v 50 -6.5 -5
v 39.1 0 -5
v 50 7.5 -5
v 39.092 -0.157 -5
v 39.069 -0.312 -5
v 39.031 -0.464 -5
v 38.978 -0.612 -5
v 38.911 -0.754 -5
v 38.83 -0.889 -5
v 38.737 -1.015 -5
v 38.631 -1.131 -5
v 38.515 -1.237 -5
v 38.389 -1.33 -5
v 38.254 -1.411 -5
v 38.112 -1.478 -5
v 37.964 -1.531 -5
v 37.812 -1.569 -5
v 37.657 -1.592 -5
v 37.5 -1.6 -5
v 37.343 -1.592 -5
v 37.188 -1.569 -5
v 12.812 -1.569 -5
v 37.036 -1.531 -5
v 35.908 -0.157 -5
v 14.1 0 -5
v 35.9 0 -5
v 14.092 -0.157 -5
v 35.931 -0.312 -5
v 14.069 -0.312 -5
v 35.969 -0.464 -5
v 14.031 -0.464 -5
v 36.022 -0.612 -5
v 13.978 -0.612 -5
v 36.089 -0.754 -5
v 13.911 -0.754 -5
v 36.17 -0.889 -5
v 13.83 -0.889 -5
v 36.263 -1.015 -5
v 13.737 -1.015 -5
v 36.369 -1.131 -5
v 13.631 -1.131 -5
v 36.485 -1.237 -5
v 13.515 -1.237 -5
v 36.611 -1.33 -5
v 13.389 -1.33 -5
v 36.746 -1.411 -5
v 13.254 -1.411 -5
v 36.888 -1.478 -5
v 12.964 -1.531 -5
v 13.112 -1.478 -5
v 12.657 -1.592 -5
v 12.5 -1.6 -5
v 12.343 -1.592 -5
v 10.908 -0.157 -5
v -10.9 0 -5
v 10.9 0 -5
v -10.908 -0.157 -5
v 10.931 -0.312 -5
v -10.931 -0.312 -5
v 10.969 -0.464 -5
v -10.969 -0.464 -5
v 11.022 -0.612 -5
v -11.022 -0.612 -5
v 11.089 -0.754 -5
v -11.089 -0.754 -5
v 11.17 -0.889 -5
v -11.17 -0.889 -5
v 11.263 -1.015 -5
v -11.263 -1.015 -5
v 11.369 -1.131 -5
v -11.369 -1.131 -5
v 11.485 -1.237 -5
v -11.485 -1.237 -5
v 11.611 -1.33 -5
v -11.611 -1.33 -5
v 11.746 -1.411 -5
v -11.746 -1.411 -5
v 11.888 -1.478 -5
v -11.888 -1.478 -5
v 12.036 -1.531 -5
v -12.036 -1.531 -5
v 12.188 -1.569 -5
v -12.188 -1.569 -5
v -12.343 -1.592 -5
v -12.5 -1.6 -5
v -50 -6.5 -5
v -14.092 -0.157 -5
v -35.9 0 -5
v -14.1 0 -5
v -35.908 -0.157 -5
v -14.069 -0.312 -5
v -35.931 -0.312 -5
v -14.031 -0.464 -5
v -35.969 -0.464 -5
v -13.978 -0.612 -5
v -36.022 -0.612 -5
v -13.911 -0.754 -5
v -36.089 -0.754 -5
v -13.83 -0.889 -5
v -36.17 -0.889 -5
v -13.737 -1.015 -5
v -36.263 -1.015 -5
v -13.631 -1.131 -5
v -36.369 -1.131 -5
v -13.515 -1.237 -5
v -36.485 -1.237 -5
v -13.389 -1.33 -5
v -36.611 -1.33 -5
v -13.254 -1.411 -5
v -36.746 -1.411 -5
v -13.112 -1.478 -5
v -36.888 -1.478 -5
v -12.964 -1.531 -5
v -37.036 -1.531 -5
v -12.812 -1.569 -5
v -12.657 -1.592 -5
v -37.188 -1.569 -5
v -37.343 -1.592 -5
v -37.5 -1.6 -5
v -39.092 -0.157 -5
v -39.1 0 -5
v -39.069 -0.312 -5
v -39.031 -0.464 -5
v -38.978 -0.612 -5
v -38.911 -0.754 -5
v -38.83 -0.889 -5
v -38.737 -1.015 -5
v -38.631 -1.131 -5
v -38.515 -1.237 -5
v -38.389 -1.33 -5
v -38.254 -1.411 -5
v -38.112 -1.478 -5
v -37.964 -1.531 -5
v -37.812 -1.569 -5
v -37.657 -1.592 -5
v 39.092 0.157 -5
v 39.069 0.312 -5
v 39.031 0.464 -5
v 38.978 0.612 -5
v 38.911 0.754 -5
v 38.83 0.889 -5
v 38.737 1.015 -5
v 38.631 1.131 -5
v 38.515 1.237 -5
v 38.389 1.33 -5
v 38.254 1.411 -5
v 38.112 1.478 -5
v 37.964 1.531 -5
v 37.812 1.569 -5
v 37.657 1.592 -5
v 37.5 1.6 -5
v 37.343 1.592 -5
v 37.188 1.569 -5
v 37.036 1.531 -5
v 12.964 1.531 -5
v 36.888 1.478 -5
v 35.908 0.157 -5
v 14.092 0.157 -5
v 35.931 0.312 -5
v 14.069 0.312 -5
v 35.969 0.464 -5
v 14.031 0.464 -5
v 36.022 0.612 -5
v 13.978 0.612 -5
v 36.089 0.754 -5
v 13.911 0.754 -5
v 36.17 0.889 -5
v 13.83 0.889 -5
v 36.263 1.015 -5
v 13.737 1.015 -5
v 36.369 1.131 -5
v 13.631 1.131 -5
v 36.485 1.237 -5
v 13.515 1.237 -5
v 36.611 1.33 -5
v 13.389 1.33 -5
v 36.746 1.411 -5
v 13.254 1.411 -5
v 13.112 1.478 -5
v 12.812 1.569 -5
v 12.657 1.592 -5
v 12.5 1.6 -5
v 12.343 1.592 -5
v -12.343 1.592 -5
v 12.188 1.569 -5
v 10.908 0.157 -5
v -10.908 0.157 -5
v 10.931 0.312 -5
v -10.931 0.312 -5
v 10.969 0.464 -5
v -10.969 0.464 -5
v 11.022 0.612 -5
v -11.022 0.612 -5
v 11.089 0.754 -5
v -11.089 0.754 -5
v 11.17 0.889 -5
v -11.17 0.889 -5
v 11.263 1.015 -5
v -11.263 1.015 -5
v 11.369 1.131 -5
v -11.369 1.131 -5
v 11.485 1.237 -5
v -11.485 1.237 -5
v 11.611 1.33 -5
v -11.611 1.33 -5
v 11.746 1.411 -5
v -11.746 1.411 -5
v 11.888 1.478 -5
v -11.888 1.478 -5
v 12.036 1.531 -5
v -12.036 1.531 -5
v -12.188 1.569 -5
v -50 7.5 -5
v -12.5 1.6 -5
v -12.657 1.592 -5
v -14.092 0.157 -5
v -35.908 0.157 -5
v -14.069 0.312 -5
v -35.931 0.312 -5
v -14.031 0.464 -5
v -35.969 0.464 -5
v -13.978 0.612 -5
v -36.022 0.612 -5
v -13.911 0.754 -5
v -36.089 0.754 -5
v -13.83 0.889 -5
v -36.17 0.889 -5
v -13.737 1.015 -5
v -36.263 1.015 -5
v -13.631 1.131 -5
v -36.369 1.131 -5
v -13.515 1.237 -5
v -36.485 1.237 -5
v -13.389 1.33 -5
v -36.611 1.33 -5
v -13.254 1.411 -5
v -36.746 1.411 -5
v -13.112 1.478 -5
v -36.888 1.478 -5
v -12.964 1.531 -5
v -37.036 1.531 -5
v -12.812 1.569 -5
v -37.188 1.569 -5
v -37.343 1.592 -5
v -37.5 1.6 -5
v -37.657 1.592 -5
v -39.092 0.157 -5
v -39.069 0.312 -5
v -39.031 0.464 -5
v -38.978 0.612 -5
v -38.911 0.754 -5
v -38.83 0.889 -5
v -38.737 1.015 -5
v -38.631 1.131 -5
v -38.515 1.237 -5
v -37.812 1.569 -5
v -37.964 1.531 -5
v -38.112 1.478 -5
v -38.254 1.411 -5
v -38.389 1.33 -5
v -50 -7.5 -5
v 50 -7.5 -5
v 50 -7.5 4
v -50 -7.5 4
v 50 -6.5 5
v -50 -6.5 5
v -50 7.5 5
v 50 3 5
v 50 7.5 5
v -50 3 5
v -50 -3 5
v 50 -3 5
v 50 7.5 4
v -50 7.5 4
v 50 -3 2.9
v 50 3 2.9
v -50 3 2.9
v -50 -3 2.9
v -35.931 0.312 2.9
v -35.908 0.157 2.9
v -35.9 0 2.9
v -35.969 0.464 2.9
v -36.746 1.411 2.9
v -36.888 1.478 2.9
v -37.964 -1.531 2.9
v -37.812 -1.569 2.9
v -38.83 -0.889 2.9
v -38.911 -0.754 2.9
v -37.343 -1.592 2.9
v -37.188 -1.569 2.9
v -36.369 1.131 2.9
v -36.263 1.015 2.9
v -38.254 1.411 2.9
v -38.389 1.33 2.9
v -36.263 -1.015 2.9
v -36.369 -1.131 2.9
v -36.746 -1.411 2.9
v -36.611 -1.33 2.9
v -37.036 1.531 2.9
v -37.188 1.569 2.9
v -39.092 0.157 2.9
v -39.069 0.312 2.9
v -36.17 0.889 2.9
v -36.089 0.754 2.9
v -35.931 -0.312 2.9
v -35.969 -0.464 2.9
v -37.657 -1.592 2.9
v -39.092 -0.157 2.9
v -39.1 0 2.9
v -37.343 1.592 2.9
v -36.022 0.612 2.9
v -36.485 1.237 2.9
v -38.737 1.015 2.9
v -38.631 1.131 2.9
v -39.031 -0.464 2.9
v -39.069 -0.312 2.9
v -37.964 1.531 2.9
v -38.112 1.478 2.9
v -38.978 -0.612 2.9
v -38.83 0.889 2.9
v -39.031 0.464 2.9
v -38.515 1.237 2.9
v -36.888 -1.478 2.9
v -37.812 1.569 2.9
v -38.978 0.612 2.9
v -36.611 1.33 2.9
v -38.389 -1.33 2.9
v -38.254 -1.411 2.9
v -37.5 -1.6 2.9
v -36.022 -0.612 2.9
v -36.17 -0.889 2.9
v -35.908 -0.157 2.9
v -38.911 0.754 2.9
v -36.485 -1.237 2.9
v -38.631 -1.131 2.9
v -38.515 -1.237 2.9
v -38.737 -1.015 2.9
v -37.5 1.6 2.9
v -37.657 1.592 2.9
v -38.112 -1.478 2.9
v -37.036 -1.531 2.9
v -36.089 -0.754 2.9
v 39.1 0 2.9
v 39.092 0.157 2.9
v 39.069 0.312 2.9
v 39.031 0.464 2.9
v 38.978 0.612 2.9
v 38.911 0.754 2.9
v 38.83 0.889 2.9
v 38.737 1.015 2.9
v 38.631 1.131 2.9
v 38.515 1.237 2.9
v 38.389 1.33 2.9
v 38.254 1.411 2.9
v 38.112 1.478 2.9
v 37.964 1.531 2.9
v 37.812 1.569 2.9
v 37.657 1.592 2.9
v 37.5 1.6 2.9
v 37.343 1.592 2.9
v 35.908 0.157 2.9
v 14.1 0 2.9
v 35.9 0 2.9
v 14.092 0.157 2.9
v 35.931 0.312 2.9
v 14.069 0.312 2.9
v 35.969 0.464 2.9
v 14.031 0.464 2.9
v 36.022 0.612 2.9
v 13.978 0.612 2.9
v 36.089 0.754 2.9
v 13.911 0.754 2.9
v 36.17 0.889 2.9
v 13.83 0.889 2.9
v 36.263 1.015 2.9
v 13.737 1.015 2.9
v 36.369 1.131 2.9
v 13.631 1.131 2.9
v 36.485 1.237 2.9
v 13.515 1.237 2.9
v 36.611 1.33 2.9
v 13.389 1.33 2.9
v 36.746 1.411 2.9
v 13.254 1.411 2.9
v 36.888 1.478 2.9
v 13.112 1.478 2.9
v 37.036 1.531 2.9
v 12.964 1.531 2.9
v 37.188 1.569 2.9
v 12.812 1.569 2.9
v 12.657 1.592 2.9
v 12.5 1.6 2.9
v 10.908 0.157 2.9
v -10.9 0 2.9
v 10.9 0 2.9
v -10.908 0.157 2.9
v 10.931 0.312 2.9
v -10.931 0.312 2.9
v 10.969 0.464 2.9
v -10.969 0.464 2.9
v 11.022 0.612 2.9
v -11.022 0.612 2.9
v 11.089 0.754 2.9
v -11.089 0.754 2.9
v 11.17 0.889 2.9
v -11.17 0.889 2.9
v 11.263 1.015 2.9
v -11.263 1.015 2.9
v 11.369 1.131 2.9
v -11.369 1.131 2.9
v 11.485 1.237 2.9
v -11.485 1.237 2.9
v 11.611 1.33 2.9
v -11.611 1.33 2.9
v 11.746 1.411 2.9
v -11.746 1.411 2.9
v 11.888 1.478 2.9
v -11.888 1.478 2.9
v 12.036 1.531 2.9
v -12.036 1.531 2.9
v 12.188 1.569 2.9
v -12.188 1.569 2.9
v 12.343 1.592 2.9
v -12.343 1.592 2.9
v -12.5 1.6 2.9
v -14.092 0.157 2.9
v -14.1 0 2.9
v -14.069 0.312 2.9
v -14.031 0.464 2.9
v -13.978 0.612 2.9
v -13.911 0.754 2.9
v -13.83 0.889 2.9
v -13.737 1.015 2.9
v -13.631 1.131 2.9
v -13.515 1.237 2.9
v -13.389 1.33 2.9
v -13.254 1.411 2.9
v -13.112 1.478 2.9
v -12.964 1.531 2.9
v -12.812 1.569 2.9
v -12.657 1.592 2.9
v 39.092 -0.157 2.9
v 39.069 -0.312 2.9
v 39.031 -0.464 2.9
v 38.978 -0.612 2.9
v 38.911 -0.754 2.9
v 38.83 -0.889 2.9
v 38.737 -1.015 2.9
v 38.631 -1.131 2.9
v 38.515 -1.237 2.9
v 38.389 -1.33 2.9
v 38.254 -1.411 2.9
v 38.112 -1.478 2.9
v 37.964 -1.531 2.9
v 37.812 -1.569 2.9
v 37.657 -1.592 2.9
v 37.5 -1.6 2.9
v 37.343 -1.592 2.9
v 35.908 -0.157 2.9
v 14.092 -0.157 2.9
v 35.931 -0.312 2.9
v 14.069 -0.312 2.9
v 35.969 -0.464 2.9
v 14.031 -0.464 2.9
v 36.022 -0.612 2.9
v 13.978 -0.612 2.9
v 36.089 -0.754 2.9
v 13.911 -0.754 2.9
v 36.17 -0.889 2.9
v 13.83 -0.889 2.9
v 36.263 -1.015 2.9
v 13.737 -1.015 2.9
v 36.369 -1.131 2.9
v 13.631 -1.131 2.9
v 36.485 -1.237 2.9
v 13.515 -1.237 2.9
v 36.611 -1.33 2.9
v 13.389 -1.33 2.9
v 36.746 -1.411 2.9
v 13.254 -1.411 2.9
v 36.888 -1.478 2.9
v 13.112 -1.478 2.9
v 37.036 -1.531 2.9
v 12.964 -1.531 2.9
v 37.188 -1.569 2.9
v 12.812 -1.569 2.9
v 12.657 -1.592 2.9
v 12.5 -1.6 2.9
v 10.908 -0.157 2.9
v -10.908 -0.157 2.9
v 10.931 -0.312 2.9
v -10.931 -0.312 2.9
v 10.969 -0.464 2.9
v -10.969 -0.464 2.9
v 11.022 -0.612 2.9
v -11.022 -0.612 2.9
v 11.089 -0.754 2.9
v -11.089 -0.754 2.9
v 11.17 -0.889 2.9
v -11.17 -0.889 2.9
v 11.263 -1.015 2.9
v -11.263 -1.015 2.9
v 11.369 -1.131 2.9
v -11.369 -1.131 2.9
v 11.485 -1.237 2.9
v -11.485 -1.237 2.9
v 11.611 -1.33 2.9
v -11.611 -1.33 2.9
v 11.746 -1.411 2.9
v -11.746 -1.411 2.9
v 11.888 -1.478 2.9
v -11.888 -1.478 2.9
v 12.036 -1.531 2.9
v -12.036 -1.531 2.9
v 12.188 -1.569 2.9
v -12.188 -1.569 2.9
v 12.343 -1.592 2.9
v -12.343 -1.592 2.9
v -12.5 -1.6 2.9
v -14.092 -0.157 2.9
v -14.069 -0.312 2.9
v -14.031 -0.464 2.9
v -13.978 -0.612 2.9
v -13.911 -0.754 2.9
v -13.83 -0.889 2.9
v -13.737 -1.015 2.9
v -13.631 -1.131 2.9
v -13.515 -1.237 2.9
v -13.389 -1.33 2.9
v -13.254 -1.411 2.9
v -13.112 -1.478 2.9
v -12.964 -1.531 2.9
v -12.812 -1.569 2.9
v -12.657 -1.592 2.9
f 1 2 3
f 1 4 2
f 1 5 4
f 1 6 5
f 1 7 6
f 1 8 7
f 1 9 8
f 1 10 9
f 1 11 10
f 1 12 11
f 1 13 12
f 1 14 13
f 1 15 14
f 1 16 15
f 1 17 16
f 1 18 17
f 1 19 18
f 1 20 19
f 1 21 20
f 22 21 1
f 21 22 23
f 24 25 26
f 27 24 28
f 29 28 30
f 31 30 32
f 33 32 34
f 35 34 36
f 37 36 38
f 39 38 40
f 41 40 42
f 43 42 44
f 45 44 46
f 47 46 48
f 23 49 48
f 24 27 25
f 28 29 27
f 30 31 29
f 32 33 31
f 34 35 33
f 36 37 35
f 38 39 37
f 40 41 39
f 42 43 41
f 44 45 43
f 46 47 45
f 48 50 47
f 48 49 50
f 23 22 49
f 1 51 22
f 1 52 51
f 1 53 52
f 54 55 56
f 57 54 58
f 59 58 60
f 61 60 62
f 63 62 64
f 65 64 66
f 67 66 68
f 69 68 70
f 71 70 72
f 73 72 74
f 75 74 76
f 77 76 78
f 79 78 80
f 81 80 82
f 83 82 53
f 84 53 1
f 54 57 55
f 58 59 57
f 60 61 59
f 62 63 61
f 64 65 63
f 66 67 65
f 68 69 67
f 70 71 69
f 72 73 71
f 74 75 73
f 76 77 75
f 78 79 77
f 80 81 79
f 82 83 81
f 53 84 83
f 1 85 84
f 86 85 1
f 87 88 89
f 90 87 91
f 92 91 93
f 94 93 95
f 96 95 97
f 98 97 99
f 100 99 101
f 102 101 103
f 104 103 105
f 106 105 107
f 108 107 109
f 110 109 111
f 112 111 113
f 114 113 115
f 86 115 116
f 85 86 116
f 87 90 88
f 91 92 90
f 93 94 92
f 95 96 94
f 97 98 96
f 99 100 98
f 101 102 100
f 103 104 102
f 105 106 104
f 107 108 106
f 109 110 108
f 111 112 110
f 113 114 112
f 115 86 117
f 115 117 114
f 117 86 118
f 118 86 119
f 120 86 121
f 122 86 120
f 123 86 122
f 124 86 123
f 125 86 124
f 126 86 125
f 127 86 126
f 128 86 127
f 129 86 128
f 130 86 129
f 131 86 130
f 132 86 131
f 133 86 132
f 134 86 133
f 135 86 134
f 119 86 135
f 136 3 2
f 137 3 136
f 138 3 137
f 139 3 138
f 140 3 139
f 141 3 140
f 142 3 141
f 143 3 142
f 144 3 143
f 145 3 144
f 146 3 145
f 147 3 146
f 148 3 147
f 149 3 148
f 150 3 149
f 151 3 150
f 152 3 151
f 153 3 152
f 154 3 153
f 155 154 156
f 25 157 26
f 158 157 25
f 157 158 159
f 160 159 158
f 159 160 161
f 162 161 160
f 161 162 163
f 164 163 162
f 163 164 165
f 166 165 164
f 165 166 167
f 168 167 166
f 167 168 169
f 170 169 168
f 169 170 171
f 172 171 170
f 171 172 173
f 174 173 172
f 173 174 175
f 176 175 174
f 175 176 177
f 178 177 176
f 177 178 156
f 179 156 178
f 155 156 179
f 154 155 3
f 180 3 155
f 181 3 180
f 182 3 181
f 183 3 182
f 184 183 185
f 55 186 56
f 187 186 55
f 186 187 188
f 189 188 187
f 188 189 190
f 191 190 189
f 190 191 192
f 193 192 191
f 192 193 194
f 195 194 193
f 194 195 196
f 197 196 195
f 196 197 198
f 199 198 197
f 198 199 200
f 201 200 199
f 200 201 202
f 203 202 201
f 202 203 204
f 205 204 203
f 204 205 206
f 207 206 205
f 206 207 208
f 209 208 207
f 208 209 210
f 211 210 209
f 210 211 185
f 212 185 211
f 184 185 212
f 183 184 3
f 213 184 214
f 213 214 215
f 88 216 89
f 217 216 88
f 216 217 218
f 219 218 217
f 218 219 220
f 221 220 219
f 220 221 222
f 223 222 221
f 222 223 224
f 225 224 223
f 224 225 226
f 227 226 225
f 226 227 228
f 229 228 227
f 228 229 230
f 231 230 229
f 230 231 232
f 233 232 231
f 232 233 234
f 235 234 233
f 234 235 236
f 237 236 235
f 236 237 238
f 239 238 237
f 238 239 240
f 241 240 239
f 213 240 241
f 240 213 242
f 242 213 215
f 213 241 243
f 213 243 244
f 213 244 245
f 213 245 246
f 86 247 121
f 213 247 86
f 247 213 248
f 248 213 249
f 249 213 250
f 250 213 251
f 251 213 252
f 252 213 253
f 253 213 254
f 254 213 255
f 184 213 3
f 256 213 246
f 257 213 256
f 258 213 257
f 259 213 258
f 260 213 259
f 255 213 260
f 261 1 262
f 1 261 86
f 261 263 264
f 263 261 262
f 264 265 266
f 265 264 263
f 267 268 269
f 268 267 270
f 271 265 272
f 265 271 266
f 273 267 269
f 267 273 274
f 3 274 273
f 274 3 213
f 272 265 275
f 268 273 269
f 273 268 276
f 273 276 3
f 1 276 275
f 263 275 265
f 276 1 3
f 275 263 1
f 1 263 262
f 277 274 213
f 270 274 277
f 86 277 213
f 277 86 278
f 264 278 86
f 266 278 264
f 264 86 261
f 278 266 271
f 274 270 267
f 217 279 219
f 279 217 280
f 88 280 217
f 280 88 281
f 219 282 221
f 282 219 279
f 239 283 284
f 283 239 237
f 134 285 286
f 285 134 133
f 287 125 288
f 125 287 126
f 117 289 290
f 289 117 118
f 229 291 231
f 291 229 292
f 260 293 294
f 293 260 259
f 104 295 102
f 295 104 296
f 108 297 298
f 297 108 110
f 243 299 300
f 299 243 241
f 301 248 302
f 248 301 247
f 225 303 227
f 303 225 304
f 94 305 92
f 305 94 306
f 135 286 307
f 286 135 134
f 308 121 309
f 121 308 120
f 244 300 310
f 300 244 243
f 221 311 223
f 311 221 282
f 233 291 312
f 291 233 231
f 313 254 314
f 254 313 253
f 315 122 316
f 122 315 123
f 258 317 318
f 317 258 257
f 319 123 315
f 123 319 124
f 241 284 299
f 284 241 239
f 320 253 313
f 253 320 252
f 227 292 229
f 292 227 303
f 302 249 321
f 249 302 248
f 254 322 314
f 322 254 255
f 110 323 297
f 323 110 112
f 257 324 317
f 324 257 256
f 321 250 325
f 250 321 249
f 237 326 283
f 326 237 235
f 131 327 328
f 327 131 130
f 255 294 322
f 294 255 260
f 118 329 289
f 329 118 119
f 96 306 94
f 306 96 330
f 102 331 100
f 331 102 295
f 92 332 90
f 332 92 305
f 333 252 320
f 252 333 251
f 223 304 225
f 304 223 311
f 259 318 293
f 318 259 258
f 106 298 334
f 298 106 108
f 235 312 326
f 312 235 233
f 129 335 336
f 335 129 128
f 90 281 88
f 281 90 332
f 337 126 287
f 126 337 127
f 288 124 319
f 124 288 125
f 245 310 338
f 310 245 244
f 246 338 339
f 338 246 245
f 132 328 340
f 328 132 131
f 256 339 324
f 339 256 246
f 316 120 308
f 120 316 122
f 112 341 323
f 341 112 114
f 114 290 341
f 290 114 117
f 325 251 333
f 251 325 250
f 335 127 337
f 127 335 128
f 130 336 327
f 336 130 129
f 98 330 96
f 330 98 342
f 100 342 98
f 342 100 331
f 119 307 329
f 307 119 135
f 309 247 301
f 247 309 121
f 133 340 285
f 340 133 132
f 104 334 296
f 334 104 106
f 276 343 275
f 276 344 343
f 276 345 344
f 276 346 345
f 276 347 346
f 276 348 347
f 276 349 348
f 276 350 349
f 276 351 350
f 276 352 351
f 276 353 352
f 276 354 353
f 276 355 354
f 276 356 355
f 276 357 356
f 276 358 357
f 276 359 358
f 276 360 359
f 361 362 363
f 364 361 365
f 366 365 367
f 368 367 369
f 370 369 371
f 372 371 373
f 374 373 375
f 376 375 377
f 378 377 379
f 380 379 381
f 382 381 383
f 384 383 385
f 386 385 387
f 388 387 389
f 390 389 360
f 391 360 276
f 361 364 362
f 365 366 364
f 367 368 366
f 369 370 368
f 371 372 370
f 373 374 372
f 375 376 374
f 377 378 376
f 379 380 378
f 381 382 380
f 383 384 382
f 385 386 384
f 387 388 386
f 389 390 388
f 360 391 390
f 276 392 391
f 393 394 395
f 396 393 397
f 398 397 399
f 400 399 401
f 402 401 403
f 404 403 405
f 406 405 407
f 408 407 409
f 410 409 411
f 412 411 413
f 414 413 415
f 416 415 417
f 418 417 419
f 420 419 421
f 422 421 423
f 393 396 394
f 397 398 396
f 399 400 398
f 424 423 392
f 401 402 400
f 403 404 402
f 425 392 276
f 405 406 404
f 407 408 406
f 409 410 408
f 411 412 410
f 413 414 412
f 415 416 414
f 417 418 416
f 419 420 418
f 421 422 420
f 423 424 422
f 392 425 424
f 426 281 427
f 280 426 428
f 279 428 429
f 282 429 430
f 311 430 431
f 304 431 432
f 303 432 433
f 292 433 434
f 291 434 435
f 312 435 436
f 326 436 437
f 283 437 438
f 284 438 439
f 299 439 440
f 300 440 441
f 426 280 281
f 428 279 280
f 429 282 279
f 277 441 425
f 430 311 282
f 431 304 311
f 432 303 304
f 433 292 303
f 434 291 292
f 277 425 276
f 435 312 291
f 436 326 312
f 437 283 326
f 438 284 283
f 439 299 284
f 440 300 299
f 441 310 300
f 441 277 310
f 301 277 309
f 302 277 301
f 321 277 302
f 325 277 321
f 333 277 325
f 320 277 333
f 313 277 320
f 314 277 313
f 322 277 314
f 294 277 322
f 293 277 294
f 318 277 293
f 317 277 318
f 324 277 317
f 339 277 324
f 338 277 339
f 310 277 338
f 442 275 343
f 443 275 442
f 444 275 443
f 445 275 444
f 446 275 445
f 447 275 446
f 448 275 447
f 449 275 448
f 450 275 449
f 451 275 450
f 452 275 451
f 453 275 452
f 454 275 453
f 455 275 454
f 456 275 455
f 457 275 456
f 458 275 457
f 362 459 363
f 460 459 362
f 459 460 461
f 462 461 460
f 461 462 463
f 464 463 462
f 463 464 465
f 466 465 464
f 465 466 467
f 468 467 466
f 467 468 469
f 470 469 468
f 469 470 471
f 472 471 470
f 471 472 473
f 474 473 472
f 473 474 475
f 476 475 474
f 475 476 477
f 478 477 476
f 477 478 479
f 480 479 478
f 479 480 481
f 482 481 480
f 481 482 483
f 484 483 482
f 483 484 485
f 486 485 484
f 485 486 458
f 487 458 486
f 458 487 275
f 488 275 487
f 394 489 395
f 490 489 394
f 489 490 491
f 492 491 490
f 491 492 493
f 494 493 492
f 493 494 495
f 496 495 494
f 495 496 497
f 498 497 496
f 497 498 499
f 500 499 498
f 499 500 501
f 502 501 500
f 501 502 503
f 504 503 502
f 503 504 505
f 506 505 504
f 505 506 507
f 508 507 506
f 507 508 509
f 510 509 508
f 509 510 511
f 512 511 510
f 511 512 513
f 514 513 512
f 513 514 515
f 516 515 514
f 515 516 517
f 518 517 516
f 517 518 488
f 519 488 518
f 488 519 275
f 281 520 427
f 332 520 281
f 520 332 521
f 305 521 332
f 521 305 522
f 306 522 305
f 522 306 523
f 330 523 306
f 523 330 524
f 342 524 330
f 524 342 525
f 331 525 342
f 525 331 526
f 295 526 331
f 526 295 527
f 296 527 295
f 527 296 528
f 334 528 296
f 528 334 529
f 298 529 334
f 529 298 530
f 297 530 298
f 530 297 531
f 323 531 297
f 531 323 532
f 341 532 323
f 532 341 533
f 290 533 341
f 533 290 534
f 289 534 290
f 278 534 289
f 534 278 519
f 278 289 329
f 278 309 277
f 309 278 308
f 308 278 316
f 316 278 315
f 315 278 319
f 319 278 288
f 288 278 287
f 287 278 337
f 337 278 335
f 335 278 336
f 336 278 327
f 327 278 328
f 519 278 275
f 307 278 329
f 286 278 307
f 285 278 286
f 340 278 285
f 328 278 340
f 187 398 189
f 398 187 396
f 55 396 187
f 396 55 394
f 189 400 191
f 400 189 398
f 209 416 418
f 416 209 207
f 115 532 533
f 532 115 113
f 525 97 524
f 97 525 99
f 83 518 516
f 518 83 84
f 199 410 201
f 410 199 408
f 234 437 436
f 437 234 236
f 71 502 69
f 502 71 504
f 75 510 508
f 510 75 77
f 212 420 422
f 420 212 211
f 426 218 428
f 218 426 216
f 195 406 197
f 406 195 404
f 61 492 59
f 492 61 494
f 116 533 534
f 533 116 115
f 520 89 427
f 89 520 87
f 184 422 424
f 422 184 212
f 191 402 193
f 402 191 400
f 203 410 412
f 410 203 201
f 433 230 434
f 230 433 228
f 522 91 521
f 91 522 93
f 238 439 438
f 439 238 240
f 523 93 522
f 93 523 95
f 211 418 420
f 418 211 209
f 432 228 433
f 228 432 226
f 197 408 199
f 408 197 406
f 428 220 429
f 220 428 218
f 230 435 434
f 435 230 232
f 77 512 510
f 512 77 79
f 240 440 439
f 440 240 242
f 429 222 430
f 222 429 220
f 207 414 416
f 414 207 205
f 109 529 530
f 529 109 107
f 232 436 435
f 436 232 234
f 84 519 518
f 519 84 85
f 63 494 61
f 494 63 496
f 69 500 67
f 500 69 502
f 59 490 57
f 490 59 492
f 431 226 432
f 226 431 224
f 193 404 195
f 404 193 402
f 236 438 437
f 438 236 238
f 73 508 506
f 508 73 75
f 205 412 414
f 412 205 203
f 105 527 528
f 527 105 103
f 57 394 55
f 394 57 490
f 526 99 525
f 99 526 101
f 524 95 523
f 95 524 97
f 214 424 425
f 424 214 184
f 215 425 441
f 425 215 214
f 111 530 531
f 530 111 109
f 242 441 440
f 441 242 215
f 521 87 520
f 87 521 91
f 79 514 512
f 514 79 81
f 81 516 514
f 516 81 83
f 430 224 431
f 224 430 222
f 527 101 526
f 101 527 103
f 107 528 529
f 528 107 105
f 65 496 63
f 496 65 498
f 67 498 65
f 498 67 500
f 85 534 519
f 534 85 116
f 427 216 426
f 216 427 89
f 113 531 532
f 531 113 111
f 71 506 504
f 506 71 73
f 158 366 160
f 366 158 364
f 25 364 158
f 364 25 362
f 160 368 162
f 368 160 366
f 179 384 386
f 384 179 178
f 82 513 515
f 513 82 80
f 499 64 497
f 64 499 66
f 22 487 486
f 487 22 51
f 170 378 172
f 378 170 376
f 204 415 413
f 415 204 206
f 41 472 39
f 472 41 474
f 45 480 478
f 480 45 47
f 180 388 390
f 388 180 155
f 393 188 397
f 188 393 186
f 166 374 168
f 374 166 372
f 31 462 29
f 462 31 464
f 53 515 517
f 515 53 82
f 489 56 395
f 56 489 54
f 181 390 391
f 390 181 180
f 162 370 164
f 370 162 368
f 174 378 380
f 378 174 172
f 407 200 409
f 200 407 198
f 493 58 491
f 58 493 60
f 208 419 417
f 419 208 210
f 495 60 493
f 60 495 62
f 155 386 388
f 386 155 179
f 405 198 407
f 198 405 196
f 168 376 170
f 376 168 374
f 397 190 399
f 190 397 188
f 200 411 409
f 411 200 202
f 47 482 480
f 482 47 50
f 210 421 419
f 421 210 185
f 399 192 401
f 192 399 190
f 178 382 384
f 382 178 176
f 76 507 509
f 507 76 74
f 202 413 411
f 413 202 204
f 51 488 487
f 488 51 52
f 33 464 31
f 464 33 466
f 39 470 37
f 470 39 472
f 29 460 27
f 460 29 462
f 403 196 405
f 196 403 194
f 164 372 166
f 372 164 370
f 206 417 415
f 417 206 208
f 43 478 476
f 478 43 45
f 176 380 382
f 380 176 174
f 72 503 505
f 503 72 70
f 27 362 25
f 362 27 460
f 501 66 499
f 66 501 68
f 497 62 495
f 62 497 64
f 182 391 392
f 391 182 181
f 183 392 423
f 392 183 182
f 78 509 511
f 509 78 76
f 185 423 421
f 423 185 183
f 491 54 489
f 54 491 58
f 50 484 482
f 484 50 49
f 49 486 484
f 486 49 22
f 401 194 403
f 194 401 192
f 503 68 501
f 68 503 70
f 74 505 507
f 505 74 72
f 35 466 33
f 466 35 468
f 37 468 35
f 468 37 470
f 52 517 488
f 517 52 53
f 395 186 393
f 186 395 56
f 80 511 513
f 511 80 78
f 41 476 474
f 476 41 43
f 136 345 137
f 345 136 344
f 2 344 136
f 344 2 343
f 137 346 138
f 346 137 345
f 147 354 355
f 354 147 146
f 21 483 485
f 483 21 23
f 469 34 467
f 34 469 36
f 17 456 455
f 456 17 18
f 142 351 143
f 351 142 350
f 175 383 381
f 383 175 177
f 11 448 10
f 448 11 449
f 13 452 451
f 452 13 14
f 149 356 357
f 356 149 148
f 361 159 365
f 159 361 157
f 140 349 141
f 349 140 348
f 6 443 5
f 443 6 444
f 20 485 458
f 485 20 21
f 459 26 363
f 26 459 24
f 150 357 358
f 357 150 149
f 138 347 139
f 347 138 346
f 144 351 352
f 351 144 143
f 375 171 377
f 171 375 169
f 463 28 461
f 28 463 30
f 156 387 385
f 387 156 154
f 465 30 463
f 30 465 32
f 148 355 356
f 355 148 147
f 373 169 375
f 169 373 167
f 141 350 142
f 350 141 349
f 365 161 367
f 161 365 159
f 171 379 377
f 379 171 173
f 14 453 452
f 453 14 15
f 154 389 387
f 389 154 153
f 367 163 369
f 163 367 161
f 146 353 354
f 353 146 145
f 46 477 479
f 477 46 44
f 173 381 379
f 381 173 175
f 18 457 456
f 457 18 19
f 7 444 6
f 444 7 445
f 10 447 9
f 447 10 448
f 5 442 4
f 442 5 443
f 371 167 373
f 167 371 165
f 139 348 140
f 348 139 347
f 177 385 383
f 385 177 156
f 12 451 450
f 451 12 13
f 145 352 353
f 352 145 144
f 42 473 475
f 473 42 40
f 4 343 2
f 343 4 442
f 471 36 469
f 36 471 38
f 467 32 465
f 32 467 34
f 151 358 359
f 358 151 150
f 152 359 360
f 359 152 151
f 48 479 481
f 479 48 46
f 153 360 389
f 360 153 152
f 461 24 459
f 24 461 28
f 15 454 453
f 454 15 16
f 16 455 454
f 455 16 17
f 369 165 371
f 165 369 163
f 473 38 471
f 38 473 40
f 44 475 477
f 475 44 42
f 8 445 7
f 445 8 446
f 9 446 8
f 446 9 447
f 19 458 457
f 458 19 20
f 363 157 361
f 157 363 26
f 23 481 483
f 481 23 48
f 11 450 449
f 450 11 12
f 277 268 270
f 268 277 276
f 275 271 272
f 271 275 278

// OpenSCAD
$fn=64;

rail_w = 15.0;
rail_h = 10.0;
rail_l = 100.0;

edge_chamfer = 1.0;

slot_w = 6.0;
slot_depth = 2.0;

hole_d = 3.2;
hole_csk_d = 6.0;
hole_csk_h = 2.0;
hole_pitch = 25.0;
hole_count = 4;

module chamfered_block(w,h,l,c){
    difference(){
        cube([l,w,h], center=true);
        for (sx=[-1,1], sy=[-1,1]) {
            translate([0, sy*(w/2), sx*(h/2)])
                rotate([0,90,0])
                    linear_extrude(height=l+2, center=true)
                        polygon(points=[[0,0],[c,0],[0,c]]);
        }
    }
}

module counterbore_hole(d_thru, d_cb, h_cb, h_total){
    union(){
        cylinder(d=d_thru, h=h_total+2, center=true);
        translate([0,0,(h_total/2)-(h_cb/2)])
            cylinder(d=d_cb, h=h_cb+0.2, center=true);
    }
}

module rail(){
    difference(){
        chamfered_block(rail_w, rail_h, rail_l, edge_chamfer);

        translate([0,0,(rail_h/2)-(slot_depth/2)])
            cube([rail_l+2, slot_w, slot_depth+0.2], center=true);

        for(i=[0:hole_count-1]){
            x = -rail_l/2 + hole_pitch/2 + i*hole_pitch;
            translate([x,0,0])
                counterbore_hole(hole_d, hole_csk_d, hole_csk_h, rail_h);
        }
    }
}

rail();
